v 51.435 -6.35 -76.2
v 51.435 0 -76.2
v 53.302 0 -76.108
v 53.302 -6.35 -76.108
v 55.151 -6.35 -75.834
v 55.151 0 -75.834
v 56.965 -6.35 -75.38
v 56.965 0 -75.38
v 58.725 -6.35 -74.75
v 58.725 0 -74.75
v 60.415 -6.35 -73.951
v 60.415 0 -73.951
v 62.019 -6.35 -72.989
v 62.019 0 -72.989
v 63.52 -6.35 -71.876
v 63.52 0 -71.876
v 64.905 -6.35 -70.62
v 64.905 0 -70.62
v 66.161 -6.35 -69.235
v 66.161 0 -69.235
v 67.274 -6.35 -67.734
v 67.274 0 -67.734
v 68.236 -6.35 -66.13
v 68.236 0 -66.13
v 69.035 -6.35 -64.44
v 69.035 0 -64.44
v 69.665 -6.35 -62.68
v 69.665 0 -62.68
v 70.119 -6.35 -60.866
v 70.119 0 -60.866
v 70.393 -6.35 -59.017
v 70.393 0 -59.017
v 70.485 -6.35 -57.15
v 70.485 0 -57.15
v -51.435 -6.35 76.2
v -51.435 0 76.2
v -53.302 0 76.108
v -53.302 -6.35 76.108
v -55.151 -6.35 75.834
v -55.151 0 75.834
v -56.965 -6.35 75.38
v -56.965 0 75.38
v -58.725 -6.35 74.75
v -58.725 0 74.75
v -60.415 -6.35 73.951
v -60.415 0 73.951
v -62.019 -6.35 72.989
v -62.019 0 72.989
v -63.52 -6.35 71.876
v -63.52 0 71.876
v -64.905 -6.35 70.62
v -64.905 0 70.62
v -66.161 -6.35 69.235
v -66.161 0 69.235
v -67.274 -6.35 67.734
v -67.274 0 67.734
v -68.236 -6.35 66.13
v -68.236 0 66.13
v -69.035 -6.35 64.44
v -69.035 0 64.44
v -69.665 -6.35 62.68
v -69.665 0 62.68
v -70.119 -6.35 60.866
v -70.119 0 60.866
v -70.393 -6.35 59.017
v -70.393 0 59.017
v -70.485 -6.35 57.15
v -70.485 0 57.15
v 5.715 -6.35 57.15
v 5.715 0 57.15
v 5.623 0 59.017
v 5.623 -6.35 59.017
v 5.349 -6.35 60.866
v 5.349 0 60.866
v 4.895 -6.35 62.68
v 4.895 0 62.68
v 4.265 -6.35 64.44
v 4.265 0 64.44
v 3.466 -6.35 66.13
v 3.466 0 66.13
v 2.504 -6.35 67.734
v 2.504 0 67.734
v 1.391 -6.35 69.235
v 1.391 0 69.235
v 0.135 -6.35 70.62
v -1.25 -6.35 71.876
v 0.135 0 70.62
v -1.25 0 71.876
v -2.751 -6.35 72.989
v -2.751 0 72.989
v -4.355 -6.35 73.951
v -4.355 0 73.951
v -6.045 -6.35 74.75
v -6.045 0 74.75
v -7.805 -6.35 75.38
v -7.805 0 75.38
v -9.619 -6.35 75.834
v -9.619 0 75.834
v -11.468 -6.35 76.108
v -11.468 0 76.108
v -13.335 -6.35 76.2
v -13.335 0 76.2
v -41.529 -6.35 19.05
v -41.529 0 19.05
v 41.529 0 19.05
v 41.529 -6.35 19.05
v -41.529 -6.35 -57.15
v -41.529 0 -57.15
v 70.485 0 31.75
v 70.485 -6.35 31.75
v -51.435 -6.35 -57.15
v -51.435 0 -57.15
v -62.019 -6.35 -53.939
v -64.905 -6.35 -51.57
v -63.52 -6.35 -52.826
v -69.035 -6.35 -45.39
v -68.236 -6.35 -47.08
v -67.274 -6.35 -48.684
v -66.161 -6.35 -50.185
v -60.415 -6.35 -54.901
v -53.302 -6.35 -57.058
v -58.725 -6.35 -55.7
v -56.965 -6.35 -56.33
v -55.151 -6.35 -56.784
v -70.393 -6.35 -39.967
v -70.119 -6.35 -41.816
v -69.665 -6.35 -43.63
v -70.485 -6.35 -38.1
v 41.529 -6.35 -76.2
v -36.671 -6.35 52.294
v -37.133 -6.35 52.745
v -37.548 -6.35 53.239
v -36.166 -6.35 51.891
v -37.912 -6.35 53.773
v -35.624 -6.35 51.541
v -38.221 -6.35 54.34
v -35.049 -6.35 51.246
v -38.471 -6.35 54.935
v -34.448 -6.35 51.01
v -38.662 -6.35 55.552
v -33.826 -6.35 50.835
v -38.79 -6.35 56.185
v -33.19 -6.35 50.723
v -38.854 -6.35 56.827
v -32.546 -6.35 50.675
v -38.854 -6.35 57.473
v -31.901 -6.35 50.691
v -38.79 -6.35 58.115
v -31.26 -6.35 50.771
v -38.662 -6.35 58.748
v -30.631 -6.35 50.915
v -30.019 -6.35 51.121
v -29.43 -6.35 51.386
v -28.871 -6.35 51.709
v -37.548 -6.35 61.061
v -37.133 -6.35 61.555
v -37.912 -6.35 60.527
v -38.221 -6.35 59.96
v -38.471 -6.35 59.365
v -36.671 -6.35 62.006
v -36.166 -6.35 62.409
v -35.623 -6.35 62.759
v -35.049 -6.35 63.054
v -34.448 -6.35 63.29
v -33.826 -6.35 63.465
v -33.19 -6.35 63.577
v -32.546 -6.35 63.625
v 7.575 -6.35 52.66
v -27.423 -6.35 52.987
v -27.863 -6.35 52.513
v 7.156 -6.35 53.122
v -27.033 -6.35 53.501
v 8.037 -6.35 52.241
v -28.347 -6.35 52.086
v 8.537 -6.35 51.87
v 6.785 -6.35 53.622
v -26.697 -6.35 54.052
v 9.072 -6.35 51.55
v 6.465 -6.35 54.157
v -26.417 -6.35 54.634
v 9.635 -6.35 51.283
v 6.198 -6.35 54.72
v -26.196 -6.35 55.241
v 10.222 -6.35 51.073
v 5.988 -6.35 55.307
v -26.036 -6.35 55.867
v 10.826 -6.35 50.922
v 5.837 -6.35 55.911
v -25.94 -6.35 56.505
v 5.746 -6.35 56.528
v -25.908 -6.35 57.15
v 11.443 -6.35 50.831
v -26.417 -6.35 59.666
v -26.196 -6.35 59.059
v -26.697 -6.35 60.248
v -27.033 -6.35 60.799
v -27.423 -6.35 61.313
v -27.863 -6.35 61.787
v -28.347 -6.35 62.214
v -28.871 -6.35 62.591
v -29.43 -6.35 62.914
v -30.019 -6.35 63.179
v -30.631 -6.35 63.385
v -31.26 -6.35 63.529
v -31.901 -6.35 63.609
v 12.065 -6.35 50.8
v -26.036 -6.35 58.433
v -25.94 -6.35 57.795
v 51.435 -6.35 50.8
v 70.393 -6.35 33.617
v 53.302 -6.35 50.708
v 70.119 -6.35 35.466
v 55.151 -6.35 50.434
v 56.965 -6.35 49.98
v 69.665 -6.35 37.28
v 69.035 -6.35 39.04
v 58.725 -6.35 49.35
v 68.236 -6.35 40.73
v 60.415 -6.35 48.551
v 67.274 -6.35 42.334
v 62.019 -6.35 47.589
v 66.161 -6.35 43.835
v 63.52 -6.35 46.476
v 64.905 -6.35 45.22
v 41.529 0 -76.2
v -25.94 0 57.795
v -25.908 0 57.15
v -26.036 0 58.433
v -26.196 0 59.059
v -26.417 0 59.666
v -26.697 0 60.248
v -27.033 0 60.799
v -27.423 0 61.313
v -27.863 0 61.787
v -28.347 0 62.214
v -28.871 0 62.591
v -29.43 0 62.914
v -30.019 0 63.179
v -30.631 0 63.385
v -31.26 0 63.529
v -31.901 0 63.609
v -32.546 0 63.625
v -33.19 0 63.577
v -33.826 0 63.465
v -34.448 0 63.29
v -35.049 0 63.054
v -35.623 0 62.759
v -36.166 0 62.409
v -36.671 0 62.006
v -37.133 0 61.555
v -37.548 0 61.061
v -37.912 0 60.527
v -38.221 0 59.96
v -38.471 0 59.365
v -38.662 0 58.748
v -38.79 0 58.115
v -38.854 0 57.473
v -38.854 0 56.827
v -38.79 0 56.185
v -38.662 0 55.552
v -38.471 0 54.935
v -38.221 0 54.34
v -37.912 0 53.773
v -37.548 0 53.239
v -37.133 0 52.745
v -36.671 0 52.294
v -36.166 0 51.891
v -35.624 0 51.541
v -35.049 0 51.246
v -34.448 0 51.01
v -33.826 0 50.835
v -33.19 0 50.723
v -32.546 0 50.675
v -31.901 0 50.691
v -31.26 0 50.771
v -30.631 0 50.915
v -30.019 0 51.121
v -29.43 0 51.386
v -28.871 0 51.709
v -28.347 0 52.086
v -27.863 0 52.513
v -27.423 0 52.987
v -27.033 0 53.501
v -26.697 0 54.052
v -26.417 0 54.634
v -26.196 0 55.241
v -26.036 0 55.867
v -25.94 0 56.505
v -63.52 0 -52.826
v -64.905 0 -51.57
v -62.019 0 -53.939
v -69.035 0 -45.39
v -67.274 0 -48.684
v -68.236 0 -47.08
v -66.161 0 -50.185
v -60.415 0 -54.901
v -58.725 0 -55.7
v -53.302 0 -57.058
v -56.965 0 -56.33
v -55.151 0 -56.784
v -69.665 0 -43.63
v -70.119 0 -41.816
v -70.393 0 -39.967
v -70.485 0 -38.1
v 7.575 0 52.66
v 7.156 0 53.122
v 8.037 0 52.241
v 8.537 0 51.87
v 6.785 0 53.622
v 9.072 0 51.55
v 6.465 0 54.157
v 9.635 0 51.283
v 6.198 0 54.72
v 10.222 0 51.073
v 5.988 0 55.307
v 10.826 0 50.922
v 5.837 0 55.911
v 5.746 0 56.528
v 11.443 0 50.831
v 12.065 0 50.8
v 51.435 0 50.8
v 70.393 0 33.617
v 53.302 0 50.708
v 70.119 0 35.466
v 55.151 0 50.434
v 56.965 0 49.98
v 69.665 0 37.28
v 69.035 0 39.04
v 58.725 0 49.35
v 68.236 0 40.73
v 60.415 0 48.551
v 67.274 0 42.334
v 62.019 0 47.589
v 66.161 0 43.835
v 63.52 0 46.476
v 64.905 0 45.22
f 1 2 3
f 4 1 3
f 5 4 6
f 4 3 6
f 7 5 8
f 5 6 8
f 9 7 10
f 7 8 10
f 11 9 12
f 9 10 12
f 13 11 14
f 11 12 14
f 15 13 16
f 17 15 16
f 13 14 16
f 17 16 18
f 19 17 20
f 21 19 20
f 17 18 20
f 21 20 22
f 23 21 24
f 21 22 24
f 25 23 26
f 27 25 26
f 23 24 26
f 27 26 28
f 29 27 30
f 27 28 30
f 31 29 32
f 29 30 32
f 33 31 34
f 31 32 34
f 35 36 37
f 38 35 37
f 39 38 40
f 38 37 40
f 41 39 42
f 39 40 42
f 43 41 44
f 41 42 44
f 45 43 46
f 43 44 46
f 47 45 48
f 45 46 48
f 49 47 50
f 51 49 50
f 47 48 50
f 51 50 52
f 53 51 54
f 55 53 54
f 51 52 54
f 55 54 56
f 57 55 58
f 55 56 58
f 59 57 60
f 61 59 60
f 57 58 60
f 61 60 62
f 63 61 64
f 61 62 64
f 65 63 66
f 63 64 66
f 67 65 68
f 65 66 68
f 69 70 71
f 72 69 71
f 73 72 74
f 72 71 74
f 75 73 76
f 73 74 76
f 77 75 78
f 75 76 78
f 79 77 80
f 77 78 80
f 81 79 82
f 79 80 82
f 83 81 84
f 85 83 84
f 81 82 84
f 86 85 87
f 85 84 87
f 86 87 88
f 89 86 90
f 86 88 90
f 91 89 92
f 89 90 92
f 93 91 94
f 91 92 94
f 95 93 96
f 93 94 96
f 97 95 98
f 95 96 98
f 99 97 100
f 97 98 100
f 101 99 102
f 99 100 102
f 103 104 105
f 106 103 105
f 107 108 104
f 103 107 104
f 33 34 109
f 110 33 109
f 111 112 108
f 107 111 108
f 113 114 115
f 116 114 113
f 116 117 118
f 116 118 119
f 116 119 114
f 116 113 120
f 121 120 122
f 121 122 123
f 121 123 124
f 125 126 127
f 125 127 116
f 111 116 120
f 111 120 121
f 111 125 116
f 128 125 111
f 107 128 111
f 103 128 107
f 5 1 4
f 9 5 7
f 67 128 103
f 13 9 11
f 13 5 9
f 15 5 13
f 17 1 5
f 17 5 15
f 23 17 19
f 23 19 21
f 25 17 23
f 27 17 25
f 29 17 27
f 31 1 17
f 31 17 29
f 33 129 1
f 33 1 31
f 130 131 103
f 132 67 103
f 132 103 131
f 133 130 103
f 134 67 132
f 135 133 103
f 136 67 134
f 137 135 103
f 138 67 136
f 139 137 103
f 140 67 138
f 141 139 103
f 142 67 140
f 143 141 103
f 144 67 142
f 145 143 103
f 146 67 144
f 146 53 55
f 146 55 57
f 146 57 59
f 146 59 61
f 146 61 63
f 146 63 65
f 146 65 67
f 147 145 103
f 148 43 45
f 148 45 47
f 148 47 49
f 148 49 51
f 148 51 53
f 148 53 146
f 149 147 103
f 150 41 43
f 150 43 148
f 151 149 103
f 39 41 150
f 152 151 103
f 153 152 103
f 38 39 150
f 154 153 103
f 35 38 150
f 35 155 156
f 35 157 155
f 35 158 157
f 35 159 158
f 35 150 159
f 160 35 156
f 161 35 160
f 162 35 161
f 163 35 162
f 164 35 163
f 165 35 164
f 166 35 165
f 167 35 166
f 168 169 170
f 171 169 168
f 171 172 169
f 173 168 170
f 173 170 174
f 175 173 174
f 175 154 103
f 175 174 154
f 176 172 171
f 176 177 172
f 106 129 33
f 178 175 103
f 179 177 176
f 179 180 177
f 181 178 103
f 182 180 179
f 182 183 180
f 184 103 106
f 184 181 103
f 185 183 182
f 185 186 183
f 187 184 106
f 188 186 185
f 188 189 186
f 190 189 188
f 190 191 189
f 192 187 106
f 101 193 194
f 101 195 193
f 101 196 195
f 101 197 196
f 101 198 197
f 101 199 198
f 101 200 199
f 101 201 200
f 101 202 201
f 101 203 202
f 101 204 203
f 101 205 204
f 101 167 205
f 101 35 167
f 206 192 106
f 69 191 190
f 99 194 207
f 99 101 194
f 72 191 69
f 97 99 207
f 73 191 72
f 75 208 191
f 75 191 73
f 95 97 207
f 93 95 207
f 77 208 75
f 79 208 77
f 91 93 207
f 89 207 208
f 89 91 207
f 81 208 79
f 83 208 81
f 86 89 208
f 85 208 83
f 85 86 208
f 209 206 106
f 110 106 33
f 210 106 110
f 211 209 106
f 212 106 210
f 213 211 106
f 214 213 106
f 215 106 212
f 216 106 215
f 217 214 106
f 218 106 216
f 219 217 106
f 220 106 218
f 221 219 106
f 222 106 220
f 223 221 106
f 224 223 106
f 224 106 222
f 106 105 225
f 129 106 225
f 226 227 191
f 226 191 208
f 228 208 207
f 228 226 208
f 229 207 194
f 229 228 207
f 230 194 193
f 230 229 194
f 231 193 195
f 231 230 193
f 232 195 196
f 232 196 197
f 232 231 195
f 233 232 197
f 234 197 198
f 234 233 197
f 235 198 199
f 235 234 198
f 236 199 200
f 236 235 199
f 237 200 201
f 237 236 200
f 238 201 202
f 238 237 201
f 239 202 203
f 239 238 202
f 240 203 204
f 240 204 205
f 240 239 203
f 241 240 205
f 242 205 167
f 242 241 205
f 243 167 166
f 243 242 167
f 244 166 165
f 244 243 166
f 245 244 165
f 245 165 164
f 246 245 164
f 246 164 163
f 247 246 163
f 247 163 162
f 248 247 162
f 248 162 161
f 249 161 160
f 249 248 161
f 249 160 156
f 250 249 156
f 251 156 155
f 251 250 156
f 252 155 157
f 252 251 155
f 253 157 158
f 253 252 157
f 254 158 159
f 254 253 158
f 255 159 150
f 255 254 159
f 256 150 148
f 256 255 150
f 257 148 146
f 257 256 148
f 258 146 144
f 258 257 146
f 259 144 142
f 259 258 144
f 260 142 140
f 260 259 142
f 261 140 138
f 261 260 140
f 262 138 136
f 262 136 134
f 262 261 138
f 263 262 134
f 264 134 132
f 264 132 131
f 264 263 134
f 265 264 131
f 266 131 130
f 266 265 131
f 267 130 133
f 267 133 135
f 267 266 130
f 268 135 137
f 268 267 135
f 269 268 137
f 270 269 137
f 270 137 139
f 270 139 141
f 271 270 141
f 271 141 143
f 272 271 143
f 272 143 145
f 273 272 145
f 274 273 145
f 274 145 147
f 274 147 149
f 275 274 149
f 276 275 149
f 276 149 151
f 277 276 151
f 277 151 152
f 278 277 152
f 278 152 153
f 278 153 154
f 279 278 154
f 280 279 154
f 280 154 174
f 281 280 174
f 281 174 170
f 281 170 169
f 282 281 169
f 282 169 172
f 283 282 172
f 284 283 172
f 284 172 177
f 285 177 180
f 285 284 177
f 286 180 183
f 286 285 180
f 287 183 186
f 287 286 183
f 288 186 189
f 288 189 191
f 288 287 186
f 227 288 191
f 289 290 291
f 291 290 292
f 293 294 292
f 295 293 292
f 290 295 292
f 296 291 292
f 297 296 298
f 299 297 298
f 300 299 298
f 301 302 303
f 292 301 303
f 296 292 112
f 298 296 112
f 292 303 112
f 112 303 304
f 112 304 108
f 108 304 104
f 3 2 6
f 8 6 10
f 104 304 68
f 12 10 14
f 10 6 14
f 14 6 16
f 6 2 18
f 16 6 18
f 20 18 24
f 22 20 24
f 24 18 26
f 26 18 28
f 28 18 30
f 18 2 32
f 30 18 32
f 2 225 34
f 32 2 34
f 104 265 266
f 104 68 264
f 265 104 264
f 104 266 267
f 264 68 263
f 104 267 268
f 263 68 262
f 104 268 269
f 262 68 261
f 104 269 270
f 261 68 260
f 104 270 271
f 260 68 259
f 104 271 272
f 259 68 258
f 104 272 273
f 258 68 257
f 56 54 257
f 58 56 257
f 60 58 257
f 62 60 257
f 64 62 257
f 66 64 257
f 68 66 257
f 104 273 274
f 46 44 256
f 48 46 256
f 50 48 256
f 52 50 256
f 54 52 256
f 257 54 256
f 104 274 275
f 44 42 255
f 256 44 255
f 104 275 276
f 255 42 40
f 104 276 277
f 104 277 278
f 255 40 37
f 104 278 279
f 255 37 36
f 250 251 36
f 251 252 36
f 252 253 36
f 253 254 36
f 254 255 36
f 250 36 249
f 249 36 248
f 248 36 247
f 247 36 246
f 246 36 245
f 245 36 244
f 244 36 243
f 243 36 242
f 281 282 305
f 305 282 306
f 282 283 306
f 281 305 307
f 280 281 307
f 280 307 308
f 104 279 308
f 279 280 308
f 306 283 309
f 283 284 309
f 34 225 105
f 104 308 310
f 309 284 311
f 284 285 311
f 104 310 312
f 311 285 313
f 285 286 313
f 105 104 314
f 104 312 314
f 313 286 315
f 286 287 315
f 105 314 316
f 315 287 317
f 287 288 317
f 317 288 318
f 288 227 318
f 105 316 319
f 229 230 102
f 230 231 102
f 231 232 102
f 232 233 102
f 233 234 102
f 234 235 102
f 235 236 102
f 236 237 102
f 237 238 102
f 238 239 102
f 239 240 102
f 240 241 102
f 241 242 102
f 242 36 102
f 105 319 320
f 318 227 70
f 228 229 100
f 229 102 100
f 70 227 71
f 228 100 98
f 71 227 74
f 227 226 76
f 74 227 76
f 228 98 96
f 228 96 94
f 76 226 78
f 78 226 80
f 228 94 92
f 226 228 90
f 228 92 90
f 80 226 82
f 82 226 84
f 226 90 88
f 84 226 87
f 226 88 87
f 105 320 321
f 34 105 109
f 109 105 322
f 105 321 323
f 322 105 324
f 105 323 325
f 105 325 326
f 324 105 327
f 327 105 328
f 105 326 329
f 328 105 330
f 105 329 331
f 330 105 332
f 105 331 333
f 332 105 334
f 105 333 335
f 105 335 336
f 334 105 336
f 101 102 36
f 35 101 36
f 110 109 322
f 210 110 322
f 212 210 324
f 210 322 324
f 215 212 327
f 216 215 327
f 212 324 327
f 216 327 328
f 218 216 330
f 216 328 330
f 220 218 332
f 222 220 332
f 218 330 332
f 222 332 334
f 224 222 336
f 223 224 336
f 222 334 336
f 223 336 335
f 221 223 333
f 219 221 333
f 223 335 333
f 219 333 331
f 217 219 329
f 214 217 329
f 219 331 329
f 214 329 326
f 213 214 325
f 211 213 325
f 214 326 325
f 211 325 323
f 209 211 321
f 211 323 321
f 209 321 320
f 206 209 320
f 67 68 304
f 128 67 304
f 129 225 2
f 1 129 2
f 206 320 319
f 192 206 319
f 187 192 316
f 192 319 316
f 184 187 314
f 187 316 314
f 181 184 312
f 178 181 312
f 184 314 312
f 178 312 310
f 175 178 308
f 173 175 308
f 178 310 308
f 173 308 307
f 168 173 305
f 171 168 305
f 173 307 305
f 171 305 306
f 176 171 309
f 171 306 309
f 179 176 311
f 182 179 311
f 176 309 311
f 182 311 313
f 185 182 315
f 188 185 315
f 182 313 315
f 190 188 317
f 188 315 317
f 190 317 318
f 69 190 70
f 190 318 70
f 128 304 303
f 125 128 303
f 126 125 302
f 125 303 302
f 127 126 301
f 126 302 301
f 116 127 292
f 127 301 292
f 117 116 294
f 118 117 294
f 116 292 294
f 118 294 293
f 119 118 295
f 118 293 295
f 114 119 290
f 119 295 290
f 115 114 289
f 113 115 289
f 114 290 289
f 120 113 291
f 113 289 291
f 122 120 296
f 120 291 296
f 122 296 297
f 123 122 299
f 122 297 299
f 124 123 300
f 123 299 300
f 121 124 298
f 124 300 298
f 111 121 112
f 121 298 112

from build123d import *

# Parameters (mm, degrees)
F0_R     = 6.477
F1_DEPTH = 6.35


with BuildPart() as f1:
    # F0 (on Front) → F1 (new body)
    with BuildSketch(Plane.XZ):
        with BuildLine():
            Line((41.529, -76.2), (51.435, -76.2))
            ThreePointArc((51.435, -76.2), (64.905384, -70.620384), (70.485, -57.15))
            Line((70.485, -57.15), (70.485, 31.75))
            ThreePointArc((70.485, 31.75), (64.905384, 45.220384), (51.435, 50.8))
            Line((51.435, 50.8), (12.065, 50.8))
            ThreePointArc((12.065, 50.8), (7.574872, 52.659872), (5.715, 57.15))
            ThreePointArc((5.715, 57.15), (0.135384, 70.620384), (-13.335, 76.2))
            Line((-13.335, 76.2), (-51.435, 76.2))
            ThreePointArc((-51.435, 76.2), (-64.905384, 70.620384), (-70.485, 57.15))
            Line((-70.485, 57.15), (-70.485, -38.1))
            ThreePointArc((-70.485, -38.1), (-64.905384, -51.570384), (-51.435, -57.15))
            Line((-51.435, -57.15), (-41.529, -57.15))
            Line((-41.529, -57.15), (-41.529, 19.05))
            Line((-41.529, 19.05), (41.529, 19.05))
            Line((41.529, 19.05), (41.529, -76.2))
        make_face()
        with Locations((-32.385, 57.15)):
            Circle(F0_R, mode=Mode.SUBTRACT)
    extrude(amount=F1_DEPTH)


solid = f1.part
